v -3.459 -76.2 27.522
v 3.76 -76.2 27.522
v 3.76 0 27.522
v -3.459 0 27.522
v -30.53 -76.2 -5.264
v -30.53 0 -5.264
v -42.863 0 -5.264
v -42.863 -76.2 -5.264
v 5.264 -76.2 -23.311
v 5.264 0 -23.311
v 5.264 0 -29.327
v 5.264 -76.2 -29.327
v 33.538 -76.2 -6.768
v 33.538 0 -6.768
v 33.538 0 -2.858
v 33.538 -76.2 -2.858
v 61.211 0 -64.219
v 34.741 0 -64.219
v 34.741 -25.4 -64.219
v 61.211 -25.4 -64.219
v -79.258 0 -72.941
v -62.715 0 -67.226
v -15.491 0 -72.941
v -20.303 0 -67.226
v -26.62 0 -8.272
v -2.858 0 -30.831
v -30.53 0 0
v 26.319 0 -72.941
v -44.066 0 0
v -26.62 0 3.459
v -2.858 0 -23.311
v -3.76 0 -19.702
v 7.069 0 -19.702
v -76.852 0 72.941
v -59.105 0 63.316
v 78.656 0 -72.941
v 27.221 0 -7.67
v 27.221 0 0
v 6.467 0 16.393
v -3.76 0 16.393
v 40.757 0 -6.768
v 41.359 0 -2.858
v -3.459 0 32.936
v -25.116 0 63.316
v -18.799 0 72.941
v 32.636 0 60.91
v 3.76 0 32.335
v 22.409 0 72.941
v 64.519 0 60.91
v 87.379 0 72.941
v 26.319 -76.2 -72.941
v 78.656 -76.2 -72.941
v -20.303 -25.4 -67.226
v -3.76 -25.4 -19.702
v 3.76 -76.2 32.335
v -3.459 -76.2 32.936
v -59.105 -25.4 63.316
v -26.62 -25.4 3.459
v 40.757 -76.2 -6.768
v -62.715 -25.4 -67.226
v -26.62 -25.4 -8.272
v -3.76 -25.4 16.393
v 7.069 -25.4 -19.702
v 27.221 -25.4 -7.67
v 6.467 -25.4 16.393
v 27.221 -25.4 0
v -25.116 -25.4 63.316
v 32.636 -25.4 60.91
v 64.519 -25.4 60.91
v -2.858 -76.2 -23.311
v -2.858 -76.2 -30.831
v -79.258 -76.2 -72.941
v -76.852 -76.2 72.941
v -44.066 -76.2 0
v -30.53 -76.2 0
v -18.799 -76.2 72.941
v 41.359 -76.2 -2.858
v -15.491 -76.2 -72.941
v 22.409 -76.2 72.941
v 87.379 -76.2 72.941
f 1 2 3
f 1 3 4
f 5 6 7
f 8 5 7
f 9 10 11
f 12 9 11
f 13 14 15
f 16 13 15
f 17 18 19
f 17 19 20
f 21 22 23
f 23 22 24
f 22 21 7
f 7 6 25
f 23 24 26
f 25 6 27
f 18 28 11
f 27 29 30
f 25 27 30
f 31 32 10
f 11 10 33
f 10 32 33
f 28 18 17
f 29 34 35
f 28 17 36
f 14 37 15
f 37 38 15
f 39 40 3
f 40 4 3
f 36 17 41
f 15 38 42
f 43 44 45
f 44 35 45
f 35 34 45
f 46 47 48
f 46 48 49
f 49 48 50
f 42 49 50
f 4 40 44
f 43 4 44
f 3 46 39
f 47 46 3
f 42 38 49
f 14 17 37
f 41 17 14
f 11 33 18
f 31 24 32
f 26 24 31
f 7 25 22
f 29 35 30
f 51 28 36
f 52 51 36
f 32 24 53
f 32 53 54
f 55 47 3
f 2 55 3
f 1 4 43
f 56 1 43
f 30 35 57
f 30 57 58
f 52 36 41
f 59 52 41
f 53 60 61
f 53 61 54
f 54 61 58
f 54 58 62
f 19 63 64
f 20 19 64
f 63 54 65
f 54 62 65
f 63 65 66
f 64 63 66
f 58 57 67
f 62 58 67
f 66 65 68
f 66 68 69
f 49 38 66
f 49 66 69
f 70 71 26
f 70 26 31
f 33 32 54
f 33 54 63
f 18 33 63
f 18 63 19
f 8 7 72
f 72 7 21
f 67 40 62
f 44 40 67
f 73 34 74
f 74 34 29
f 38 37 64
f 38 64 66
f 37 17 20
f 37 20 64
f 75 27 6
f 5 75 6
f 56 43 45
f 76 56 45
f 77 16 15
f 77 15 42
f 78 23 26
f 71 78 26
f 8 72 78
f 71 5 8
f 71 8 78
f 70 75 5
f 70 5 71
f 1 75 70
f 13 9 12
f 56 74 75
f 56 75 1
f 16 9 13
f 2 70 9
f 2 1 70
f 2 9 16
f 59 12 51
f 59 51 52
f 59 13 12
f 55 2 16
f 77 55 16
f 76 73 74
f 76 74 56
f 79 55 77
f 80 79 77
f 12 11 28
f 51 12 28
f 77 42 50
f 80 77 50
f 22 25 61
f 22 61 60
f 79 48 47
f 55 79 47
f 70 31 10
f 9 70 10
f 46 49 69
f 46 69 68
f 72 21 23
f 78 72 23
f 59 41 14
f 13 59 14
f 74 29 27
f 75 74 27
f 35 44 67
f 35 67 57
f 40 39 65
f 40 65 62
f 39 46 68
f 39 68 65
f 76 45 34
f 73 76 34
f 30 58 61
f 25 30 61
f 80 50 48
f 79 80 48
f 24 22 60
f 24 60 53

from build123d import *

# Parameters (mm, degrees)
F2_DEPTH = 76.2
F3_DEPTH = 25.4


with BuildPart() as f2:
    # F0 (on Front) → F2 (new body)
    with BuildSketch(Plane.XZ):
        Polygon((-18.799344, 72.941445), (-76.851711, 72.941445), (-44.065658, 0), (-30.53013, 0), (-30.53013, -5.263816), (-42.862501, -5.263816), (-79.258025, -72.941445), (-15.490658, -72.941445), (-2.857502, -30.83092), (-2.857502, -23.311185), (5.263818, -23.311185), (5.263818, -29.326973), (26.319075, -72.941445), (78.65645, -72.941445), (40.756974, -6.767763), (33.538029, -6.767763), (33.538029, -2.8575), (41.358553, -2.8575), (87.379344, 72.941445), (22.408813, 72.941445), (3.759871, 32.334868), (3.759871, 27.522238), (-3.459081, 27.522238), (-3.459081, 32.93645), align=None)
    extrude(amount=F2_DEPTH)

    # F1 (on Front) → F3 (cut)
    with BuildSketch(Plane.XZ):
        Polygon((-25.115922, 63.316189), (-59.105132, 63.316189), (-26.619868, 3.459079), (-26.619868, -8.271711), (-62.714607, -67.226447), (-20.30329, -67.226447), (-3.75987, -19.70171), (7.068554, -19.70171), (34.741186, -64.218551), (61.210655, -64.218551), (27.221451, -7.670132), (27.221451, 0), (64.519338, 60.909871), (32.635659, 60.909871), (6.466975, 16.393026), (-3.75987, 16.393026), align=None)
    extrude(amount=F3_DEPTH, mode=Mode.SUBTRACT)


solid = f2.part
